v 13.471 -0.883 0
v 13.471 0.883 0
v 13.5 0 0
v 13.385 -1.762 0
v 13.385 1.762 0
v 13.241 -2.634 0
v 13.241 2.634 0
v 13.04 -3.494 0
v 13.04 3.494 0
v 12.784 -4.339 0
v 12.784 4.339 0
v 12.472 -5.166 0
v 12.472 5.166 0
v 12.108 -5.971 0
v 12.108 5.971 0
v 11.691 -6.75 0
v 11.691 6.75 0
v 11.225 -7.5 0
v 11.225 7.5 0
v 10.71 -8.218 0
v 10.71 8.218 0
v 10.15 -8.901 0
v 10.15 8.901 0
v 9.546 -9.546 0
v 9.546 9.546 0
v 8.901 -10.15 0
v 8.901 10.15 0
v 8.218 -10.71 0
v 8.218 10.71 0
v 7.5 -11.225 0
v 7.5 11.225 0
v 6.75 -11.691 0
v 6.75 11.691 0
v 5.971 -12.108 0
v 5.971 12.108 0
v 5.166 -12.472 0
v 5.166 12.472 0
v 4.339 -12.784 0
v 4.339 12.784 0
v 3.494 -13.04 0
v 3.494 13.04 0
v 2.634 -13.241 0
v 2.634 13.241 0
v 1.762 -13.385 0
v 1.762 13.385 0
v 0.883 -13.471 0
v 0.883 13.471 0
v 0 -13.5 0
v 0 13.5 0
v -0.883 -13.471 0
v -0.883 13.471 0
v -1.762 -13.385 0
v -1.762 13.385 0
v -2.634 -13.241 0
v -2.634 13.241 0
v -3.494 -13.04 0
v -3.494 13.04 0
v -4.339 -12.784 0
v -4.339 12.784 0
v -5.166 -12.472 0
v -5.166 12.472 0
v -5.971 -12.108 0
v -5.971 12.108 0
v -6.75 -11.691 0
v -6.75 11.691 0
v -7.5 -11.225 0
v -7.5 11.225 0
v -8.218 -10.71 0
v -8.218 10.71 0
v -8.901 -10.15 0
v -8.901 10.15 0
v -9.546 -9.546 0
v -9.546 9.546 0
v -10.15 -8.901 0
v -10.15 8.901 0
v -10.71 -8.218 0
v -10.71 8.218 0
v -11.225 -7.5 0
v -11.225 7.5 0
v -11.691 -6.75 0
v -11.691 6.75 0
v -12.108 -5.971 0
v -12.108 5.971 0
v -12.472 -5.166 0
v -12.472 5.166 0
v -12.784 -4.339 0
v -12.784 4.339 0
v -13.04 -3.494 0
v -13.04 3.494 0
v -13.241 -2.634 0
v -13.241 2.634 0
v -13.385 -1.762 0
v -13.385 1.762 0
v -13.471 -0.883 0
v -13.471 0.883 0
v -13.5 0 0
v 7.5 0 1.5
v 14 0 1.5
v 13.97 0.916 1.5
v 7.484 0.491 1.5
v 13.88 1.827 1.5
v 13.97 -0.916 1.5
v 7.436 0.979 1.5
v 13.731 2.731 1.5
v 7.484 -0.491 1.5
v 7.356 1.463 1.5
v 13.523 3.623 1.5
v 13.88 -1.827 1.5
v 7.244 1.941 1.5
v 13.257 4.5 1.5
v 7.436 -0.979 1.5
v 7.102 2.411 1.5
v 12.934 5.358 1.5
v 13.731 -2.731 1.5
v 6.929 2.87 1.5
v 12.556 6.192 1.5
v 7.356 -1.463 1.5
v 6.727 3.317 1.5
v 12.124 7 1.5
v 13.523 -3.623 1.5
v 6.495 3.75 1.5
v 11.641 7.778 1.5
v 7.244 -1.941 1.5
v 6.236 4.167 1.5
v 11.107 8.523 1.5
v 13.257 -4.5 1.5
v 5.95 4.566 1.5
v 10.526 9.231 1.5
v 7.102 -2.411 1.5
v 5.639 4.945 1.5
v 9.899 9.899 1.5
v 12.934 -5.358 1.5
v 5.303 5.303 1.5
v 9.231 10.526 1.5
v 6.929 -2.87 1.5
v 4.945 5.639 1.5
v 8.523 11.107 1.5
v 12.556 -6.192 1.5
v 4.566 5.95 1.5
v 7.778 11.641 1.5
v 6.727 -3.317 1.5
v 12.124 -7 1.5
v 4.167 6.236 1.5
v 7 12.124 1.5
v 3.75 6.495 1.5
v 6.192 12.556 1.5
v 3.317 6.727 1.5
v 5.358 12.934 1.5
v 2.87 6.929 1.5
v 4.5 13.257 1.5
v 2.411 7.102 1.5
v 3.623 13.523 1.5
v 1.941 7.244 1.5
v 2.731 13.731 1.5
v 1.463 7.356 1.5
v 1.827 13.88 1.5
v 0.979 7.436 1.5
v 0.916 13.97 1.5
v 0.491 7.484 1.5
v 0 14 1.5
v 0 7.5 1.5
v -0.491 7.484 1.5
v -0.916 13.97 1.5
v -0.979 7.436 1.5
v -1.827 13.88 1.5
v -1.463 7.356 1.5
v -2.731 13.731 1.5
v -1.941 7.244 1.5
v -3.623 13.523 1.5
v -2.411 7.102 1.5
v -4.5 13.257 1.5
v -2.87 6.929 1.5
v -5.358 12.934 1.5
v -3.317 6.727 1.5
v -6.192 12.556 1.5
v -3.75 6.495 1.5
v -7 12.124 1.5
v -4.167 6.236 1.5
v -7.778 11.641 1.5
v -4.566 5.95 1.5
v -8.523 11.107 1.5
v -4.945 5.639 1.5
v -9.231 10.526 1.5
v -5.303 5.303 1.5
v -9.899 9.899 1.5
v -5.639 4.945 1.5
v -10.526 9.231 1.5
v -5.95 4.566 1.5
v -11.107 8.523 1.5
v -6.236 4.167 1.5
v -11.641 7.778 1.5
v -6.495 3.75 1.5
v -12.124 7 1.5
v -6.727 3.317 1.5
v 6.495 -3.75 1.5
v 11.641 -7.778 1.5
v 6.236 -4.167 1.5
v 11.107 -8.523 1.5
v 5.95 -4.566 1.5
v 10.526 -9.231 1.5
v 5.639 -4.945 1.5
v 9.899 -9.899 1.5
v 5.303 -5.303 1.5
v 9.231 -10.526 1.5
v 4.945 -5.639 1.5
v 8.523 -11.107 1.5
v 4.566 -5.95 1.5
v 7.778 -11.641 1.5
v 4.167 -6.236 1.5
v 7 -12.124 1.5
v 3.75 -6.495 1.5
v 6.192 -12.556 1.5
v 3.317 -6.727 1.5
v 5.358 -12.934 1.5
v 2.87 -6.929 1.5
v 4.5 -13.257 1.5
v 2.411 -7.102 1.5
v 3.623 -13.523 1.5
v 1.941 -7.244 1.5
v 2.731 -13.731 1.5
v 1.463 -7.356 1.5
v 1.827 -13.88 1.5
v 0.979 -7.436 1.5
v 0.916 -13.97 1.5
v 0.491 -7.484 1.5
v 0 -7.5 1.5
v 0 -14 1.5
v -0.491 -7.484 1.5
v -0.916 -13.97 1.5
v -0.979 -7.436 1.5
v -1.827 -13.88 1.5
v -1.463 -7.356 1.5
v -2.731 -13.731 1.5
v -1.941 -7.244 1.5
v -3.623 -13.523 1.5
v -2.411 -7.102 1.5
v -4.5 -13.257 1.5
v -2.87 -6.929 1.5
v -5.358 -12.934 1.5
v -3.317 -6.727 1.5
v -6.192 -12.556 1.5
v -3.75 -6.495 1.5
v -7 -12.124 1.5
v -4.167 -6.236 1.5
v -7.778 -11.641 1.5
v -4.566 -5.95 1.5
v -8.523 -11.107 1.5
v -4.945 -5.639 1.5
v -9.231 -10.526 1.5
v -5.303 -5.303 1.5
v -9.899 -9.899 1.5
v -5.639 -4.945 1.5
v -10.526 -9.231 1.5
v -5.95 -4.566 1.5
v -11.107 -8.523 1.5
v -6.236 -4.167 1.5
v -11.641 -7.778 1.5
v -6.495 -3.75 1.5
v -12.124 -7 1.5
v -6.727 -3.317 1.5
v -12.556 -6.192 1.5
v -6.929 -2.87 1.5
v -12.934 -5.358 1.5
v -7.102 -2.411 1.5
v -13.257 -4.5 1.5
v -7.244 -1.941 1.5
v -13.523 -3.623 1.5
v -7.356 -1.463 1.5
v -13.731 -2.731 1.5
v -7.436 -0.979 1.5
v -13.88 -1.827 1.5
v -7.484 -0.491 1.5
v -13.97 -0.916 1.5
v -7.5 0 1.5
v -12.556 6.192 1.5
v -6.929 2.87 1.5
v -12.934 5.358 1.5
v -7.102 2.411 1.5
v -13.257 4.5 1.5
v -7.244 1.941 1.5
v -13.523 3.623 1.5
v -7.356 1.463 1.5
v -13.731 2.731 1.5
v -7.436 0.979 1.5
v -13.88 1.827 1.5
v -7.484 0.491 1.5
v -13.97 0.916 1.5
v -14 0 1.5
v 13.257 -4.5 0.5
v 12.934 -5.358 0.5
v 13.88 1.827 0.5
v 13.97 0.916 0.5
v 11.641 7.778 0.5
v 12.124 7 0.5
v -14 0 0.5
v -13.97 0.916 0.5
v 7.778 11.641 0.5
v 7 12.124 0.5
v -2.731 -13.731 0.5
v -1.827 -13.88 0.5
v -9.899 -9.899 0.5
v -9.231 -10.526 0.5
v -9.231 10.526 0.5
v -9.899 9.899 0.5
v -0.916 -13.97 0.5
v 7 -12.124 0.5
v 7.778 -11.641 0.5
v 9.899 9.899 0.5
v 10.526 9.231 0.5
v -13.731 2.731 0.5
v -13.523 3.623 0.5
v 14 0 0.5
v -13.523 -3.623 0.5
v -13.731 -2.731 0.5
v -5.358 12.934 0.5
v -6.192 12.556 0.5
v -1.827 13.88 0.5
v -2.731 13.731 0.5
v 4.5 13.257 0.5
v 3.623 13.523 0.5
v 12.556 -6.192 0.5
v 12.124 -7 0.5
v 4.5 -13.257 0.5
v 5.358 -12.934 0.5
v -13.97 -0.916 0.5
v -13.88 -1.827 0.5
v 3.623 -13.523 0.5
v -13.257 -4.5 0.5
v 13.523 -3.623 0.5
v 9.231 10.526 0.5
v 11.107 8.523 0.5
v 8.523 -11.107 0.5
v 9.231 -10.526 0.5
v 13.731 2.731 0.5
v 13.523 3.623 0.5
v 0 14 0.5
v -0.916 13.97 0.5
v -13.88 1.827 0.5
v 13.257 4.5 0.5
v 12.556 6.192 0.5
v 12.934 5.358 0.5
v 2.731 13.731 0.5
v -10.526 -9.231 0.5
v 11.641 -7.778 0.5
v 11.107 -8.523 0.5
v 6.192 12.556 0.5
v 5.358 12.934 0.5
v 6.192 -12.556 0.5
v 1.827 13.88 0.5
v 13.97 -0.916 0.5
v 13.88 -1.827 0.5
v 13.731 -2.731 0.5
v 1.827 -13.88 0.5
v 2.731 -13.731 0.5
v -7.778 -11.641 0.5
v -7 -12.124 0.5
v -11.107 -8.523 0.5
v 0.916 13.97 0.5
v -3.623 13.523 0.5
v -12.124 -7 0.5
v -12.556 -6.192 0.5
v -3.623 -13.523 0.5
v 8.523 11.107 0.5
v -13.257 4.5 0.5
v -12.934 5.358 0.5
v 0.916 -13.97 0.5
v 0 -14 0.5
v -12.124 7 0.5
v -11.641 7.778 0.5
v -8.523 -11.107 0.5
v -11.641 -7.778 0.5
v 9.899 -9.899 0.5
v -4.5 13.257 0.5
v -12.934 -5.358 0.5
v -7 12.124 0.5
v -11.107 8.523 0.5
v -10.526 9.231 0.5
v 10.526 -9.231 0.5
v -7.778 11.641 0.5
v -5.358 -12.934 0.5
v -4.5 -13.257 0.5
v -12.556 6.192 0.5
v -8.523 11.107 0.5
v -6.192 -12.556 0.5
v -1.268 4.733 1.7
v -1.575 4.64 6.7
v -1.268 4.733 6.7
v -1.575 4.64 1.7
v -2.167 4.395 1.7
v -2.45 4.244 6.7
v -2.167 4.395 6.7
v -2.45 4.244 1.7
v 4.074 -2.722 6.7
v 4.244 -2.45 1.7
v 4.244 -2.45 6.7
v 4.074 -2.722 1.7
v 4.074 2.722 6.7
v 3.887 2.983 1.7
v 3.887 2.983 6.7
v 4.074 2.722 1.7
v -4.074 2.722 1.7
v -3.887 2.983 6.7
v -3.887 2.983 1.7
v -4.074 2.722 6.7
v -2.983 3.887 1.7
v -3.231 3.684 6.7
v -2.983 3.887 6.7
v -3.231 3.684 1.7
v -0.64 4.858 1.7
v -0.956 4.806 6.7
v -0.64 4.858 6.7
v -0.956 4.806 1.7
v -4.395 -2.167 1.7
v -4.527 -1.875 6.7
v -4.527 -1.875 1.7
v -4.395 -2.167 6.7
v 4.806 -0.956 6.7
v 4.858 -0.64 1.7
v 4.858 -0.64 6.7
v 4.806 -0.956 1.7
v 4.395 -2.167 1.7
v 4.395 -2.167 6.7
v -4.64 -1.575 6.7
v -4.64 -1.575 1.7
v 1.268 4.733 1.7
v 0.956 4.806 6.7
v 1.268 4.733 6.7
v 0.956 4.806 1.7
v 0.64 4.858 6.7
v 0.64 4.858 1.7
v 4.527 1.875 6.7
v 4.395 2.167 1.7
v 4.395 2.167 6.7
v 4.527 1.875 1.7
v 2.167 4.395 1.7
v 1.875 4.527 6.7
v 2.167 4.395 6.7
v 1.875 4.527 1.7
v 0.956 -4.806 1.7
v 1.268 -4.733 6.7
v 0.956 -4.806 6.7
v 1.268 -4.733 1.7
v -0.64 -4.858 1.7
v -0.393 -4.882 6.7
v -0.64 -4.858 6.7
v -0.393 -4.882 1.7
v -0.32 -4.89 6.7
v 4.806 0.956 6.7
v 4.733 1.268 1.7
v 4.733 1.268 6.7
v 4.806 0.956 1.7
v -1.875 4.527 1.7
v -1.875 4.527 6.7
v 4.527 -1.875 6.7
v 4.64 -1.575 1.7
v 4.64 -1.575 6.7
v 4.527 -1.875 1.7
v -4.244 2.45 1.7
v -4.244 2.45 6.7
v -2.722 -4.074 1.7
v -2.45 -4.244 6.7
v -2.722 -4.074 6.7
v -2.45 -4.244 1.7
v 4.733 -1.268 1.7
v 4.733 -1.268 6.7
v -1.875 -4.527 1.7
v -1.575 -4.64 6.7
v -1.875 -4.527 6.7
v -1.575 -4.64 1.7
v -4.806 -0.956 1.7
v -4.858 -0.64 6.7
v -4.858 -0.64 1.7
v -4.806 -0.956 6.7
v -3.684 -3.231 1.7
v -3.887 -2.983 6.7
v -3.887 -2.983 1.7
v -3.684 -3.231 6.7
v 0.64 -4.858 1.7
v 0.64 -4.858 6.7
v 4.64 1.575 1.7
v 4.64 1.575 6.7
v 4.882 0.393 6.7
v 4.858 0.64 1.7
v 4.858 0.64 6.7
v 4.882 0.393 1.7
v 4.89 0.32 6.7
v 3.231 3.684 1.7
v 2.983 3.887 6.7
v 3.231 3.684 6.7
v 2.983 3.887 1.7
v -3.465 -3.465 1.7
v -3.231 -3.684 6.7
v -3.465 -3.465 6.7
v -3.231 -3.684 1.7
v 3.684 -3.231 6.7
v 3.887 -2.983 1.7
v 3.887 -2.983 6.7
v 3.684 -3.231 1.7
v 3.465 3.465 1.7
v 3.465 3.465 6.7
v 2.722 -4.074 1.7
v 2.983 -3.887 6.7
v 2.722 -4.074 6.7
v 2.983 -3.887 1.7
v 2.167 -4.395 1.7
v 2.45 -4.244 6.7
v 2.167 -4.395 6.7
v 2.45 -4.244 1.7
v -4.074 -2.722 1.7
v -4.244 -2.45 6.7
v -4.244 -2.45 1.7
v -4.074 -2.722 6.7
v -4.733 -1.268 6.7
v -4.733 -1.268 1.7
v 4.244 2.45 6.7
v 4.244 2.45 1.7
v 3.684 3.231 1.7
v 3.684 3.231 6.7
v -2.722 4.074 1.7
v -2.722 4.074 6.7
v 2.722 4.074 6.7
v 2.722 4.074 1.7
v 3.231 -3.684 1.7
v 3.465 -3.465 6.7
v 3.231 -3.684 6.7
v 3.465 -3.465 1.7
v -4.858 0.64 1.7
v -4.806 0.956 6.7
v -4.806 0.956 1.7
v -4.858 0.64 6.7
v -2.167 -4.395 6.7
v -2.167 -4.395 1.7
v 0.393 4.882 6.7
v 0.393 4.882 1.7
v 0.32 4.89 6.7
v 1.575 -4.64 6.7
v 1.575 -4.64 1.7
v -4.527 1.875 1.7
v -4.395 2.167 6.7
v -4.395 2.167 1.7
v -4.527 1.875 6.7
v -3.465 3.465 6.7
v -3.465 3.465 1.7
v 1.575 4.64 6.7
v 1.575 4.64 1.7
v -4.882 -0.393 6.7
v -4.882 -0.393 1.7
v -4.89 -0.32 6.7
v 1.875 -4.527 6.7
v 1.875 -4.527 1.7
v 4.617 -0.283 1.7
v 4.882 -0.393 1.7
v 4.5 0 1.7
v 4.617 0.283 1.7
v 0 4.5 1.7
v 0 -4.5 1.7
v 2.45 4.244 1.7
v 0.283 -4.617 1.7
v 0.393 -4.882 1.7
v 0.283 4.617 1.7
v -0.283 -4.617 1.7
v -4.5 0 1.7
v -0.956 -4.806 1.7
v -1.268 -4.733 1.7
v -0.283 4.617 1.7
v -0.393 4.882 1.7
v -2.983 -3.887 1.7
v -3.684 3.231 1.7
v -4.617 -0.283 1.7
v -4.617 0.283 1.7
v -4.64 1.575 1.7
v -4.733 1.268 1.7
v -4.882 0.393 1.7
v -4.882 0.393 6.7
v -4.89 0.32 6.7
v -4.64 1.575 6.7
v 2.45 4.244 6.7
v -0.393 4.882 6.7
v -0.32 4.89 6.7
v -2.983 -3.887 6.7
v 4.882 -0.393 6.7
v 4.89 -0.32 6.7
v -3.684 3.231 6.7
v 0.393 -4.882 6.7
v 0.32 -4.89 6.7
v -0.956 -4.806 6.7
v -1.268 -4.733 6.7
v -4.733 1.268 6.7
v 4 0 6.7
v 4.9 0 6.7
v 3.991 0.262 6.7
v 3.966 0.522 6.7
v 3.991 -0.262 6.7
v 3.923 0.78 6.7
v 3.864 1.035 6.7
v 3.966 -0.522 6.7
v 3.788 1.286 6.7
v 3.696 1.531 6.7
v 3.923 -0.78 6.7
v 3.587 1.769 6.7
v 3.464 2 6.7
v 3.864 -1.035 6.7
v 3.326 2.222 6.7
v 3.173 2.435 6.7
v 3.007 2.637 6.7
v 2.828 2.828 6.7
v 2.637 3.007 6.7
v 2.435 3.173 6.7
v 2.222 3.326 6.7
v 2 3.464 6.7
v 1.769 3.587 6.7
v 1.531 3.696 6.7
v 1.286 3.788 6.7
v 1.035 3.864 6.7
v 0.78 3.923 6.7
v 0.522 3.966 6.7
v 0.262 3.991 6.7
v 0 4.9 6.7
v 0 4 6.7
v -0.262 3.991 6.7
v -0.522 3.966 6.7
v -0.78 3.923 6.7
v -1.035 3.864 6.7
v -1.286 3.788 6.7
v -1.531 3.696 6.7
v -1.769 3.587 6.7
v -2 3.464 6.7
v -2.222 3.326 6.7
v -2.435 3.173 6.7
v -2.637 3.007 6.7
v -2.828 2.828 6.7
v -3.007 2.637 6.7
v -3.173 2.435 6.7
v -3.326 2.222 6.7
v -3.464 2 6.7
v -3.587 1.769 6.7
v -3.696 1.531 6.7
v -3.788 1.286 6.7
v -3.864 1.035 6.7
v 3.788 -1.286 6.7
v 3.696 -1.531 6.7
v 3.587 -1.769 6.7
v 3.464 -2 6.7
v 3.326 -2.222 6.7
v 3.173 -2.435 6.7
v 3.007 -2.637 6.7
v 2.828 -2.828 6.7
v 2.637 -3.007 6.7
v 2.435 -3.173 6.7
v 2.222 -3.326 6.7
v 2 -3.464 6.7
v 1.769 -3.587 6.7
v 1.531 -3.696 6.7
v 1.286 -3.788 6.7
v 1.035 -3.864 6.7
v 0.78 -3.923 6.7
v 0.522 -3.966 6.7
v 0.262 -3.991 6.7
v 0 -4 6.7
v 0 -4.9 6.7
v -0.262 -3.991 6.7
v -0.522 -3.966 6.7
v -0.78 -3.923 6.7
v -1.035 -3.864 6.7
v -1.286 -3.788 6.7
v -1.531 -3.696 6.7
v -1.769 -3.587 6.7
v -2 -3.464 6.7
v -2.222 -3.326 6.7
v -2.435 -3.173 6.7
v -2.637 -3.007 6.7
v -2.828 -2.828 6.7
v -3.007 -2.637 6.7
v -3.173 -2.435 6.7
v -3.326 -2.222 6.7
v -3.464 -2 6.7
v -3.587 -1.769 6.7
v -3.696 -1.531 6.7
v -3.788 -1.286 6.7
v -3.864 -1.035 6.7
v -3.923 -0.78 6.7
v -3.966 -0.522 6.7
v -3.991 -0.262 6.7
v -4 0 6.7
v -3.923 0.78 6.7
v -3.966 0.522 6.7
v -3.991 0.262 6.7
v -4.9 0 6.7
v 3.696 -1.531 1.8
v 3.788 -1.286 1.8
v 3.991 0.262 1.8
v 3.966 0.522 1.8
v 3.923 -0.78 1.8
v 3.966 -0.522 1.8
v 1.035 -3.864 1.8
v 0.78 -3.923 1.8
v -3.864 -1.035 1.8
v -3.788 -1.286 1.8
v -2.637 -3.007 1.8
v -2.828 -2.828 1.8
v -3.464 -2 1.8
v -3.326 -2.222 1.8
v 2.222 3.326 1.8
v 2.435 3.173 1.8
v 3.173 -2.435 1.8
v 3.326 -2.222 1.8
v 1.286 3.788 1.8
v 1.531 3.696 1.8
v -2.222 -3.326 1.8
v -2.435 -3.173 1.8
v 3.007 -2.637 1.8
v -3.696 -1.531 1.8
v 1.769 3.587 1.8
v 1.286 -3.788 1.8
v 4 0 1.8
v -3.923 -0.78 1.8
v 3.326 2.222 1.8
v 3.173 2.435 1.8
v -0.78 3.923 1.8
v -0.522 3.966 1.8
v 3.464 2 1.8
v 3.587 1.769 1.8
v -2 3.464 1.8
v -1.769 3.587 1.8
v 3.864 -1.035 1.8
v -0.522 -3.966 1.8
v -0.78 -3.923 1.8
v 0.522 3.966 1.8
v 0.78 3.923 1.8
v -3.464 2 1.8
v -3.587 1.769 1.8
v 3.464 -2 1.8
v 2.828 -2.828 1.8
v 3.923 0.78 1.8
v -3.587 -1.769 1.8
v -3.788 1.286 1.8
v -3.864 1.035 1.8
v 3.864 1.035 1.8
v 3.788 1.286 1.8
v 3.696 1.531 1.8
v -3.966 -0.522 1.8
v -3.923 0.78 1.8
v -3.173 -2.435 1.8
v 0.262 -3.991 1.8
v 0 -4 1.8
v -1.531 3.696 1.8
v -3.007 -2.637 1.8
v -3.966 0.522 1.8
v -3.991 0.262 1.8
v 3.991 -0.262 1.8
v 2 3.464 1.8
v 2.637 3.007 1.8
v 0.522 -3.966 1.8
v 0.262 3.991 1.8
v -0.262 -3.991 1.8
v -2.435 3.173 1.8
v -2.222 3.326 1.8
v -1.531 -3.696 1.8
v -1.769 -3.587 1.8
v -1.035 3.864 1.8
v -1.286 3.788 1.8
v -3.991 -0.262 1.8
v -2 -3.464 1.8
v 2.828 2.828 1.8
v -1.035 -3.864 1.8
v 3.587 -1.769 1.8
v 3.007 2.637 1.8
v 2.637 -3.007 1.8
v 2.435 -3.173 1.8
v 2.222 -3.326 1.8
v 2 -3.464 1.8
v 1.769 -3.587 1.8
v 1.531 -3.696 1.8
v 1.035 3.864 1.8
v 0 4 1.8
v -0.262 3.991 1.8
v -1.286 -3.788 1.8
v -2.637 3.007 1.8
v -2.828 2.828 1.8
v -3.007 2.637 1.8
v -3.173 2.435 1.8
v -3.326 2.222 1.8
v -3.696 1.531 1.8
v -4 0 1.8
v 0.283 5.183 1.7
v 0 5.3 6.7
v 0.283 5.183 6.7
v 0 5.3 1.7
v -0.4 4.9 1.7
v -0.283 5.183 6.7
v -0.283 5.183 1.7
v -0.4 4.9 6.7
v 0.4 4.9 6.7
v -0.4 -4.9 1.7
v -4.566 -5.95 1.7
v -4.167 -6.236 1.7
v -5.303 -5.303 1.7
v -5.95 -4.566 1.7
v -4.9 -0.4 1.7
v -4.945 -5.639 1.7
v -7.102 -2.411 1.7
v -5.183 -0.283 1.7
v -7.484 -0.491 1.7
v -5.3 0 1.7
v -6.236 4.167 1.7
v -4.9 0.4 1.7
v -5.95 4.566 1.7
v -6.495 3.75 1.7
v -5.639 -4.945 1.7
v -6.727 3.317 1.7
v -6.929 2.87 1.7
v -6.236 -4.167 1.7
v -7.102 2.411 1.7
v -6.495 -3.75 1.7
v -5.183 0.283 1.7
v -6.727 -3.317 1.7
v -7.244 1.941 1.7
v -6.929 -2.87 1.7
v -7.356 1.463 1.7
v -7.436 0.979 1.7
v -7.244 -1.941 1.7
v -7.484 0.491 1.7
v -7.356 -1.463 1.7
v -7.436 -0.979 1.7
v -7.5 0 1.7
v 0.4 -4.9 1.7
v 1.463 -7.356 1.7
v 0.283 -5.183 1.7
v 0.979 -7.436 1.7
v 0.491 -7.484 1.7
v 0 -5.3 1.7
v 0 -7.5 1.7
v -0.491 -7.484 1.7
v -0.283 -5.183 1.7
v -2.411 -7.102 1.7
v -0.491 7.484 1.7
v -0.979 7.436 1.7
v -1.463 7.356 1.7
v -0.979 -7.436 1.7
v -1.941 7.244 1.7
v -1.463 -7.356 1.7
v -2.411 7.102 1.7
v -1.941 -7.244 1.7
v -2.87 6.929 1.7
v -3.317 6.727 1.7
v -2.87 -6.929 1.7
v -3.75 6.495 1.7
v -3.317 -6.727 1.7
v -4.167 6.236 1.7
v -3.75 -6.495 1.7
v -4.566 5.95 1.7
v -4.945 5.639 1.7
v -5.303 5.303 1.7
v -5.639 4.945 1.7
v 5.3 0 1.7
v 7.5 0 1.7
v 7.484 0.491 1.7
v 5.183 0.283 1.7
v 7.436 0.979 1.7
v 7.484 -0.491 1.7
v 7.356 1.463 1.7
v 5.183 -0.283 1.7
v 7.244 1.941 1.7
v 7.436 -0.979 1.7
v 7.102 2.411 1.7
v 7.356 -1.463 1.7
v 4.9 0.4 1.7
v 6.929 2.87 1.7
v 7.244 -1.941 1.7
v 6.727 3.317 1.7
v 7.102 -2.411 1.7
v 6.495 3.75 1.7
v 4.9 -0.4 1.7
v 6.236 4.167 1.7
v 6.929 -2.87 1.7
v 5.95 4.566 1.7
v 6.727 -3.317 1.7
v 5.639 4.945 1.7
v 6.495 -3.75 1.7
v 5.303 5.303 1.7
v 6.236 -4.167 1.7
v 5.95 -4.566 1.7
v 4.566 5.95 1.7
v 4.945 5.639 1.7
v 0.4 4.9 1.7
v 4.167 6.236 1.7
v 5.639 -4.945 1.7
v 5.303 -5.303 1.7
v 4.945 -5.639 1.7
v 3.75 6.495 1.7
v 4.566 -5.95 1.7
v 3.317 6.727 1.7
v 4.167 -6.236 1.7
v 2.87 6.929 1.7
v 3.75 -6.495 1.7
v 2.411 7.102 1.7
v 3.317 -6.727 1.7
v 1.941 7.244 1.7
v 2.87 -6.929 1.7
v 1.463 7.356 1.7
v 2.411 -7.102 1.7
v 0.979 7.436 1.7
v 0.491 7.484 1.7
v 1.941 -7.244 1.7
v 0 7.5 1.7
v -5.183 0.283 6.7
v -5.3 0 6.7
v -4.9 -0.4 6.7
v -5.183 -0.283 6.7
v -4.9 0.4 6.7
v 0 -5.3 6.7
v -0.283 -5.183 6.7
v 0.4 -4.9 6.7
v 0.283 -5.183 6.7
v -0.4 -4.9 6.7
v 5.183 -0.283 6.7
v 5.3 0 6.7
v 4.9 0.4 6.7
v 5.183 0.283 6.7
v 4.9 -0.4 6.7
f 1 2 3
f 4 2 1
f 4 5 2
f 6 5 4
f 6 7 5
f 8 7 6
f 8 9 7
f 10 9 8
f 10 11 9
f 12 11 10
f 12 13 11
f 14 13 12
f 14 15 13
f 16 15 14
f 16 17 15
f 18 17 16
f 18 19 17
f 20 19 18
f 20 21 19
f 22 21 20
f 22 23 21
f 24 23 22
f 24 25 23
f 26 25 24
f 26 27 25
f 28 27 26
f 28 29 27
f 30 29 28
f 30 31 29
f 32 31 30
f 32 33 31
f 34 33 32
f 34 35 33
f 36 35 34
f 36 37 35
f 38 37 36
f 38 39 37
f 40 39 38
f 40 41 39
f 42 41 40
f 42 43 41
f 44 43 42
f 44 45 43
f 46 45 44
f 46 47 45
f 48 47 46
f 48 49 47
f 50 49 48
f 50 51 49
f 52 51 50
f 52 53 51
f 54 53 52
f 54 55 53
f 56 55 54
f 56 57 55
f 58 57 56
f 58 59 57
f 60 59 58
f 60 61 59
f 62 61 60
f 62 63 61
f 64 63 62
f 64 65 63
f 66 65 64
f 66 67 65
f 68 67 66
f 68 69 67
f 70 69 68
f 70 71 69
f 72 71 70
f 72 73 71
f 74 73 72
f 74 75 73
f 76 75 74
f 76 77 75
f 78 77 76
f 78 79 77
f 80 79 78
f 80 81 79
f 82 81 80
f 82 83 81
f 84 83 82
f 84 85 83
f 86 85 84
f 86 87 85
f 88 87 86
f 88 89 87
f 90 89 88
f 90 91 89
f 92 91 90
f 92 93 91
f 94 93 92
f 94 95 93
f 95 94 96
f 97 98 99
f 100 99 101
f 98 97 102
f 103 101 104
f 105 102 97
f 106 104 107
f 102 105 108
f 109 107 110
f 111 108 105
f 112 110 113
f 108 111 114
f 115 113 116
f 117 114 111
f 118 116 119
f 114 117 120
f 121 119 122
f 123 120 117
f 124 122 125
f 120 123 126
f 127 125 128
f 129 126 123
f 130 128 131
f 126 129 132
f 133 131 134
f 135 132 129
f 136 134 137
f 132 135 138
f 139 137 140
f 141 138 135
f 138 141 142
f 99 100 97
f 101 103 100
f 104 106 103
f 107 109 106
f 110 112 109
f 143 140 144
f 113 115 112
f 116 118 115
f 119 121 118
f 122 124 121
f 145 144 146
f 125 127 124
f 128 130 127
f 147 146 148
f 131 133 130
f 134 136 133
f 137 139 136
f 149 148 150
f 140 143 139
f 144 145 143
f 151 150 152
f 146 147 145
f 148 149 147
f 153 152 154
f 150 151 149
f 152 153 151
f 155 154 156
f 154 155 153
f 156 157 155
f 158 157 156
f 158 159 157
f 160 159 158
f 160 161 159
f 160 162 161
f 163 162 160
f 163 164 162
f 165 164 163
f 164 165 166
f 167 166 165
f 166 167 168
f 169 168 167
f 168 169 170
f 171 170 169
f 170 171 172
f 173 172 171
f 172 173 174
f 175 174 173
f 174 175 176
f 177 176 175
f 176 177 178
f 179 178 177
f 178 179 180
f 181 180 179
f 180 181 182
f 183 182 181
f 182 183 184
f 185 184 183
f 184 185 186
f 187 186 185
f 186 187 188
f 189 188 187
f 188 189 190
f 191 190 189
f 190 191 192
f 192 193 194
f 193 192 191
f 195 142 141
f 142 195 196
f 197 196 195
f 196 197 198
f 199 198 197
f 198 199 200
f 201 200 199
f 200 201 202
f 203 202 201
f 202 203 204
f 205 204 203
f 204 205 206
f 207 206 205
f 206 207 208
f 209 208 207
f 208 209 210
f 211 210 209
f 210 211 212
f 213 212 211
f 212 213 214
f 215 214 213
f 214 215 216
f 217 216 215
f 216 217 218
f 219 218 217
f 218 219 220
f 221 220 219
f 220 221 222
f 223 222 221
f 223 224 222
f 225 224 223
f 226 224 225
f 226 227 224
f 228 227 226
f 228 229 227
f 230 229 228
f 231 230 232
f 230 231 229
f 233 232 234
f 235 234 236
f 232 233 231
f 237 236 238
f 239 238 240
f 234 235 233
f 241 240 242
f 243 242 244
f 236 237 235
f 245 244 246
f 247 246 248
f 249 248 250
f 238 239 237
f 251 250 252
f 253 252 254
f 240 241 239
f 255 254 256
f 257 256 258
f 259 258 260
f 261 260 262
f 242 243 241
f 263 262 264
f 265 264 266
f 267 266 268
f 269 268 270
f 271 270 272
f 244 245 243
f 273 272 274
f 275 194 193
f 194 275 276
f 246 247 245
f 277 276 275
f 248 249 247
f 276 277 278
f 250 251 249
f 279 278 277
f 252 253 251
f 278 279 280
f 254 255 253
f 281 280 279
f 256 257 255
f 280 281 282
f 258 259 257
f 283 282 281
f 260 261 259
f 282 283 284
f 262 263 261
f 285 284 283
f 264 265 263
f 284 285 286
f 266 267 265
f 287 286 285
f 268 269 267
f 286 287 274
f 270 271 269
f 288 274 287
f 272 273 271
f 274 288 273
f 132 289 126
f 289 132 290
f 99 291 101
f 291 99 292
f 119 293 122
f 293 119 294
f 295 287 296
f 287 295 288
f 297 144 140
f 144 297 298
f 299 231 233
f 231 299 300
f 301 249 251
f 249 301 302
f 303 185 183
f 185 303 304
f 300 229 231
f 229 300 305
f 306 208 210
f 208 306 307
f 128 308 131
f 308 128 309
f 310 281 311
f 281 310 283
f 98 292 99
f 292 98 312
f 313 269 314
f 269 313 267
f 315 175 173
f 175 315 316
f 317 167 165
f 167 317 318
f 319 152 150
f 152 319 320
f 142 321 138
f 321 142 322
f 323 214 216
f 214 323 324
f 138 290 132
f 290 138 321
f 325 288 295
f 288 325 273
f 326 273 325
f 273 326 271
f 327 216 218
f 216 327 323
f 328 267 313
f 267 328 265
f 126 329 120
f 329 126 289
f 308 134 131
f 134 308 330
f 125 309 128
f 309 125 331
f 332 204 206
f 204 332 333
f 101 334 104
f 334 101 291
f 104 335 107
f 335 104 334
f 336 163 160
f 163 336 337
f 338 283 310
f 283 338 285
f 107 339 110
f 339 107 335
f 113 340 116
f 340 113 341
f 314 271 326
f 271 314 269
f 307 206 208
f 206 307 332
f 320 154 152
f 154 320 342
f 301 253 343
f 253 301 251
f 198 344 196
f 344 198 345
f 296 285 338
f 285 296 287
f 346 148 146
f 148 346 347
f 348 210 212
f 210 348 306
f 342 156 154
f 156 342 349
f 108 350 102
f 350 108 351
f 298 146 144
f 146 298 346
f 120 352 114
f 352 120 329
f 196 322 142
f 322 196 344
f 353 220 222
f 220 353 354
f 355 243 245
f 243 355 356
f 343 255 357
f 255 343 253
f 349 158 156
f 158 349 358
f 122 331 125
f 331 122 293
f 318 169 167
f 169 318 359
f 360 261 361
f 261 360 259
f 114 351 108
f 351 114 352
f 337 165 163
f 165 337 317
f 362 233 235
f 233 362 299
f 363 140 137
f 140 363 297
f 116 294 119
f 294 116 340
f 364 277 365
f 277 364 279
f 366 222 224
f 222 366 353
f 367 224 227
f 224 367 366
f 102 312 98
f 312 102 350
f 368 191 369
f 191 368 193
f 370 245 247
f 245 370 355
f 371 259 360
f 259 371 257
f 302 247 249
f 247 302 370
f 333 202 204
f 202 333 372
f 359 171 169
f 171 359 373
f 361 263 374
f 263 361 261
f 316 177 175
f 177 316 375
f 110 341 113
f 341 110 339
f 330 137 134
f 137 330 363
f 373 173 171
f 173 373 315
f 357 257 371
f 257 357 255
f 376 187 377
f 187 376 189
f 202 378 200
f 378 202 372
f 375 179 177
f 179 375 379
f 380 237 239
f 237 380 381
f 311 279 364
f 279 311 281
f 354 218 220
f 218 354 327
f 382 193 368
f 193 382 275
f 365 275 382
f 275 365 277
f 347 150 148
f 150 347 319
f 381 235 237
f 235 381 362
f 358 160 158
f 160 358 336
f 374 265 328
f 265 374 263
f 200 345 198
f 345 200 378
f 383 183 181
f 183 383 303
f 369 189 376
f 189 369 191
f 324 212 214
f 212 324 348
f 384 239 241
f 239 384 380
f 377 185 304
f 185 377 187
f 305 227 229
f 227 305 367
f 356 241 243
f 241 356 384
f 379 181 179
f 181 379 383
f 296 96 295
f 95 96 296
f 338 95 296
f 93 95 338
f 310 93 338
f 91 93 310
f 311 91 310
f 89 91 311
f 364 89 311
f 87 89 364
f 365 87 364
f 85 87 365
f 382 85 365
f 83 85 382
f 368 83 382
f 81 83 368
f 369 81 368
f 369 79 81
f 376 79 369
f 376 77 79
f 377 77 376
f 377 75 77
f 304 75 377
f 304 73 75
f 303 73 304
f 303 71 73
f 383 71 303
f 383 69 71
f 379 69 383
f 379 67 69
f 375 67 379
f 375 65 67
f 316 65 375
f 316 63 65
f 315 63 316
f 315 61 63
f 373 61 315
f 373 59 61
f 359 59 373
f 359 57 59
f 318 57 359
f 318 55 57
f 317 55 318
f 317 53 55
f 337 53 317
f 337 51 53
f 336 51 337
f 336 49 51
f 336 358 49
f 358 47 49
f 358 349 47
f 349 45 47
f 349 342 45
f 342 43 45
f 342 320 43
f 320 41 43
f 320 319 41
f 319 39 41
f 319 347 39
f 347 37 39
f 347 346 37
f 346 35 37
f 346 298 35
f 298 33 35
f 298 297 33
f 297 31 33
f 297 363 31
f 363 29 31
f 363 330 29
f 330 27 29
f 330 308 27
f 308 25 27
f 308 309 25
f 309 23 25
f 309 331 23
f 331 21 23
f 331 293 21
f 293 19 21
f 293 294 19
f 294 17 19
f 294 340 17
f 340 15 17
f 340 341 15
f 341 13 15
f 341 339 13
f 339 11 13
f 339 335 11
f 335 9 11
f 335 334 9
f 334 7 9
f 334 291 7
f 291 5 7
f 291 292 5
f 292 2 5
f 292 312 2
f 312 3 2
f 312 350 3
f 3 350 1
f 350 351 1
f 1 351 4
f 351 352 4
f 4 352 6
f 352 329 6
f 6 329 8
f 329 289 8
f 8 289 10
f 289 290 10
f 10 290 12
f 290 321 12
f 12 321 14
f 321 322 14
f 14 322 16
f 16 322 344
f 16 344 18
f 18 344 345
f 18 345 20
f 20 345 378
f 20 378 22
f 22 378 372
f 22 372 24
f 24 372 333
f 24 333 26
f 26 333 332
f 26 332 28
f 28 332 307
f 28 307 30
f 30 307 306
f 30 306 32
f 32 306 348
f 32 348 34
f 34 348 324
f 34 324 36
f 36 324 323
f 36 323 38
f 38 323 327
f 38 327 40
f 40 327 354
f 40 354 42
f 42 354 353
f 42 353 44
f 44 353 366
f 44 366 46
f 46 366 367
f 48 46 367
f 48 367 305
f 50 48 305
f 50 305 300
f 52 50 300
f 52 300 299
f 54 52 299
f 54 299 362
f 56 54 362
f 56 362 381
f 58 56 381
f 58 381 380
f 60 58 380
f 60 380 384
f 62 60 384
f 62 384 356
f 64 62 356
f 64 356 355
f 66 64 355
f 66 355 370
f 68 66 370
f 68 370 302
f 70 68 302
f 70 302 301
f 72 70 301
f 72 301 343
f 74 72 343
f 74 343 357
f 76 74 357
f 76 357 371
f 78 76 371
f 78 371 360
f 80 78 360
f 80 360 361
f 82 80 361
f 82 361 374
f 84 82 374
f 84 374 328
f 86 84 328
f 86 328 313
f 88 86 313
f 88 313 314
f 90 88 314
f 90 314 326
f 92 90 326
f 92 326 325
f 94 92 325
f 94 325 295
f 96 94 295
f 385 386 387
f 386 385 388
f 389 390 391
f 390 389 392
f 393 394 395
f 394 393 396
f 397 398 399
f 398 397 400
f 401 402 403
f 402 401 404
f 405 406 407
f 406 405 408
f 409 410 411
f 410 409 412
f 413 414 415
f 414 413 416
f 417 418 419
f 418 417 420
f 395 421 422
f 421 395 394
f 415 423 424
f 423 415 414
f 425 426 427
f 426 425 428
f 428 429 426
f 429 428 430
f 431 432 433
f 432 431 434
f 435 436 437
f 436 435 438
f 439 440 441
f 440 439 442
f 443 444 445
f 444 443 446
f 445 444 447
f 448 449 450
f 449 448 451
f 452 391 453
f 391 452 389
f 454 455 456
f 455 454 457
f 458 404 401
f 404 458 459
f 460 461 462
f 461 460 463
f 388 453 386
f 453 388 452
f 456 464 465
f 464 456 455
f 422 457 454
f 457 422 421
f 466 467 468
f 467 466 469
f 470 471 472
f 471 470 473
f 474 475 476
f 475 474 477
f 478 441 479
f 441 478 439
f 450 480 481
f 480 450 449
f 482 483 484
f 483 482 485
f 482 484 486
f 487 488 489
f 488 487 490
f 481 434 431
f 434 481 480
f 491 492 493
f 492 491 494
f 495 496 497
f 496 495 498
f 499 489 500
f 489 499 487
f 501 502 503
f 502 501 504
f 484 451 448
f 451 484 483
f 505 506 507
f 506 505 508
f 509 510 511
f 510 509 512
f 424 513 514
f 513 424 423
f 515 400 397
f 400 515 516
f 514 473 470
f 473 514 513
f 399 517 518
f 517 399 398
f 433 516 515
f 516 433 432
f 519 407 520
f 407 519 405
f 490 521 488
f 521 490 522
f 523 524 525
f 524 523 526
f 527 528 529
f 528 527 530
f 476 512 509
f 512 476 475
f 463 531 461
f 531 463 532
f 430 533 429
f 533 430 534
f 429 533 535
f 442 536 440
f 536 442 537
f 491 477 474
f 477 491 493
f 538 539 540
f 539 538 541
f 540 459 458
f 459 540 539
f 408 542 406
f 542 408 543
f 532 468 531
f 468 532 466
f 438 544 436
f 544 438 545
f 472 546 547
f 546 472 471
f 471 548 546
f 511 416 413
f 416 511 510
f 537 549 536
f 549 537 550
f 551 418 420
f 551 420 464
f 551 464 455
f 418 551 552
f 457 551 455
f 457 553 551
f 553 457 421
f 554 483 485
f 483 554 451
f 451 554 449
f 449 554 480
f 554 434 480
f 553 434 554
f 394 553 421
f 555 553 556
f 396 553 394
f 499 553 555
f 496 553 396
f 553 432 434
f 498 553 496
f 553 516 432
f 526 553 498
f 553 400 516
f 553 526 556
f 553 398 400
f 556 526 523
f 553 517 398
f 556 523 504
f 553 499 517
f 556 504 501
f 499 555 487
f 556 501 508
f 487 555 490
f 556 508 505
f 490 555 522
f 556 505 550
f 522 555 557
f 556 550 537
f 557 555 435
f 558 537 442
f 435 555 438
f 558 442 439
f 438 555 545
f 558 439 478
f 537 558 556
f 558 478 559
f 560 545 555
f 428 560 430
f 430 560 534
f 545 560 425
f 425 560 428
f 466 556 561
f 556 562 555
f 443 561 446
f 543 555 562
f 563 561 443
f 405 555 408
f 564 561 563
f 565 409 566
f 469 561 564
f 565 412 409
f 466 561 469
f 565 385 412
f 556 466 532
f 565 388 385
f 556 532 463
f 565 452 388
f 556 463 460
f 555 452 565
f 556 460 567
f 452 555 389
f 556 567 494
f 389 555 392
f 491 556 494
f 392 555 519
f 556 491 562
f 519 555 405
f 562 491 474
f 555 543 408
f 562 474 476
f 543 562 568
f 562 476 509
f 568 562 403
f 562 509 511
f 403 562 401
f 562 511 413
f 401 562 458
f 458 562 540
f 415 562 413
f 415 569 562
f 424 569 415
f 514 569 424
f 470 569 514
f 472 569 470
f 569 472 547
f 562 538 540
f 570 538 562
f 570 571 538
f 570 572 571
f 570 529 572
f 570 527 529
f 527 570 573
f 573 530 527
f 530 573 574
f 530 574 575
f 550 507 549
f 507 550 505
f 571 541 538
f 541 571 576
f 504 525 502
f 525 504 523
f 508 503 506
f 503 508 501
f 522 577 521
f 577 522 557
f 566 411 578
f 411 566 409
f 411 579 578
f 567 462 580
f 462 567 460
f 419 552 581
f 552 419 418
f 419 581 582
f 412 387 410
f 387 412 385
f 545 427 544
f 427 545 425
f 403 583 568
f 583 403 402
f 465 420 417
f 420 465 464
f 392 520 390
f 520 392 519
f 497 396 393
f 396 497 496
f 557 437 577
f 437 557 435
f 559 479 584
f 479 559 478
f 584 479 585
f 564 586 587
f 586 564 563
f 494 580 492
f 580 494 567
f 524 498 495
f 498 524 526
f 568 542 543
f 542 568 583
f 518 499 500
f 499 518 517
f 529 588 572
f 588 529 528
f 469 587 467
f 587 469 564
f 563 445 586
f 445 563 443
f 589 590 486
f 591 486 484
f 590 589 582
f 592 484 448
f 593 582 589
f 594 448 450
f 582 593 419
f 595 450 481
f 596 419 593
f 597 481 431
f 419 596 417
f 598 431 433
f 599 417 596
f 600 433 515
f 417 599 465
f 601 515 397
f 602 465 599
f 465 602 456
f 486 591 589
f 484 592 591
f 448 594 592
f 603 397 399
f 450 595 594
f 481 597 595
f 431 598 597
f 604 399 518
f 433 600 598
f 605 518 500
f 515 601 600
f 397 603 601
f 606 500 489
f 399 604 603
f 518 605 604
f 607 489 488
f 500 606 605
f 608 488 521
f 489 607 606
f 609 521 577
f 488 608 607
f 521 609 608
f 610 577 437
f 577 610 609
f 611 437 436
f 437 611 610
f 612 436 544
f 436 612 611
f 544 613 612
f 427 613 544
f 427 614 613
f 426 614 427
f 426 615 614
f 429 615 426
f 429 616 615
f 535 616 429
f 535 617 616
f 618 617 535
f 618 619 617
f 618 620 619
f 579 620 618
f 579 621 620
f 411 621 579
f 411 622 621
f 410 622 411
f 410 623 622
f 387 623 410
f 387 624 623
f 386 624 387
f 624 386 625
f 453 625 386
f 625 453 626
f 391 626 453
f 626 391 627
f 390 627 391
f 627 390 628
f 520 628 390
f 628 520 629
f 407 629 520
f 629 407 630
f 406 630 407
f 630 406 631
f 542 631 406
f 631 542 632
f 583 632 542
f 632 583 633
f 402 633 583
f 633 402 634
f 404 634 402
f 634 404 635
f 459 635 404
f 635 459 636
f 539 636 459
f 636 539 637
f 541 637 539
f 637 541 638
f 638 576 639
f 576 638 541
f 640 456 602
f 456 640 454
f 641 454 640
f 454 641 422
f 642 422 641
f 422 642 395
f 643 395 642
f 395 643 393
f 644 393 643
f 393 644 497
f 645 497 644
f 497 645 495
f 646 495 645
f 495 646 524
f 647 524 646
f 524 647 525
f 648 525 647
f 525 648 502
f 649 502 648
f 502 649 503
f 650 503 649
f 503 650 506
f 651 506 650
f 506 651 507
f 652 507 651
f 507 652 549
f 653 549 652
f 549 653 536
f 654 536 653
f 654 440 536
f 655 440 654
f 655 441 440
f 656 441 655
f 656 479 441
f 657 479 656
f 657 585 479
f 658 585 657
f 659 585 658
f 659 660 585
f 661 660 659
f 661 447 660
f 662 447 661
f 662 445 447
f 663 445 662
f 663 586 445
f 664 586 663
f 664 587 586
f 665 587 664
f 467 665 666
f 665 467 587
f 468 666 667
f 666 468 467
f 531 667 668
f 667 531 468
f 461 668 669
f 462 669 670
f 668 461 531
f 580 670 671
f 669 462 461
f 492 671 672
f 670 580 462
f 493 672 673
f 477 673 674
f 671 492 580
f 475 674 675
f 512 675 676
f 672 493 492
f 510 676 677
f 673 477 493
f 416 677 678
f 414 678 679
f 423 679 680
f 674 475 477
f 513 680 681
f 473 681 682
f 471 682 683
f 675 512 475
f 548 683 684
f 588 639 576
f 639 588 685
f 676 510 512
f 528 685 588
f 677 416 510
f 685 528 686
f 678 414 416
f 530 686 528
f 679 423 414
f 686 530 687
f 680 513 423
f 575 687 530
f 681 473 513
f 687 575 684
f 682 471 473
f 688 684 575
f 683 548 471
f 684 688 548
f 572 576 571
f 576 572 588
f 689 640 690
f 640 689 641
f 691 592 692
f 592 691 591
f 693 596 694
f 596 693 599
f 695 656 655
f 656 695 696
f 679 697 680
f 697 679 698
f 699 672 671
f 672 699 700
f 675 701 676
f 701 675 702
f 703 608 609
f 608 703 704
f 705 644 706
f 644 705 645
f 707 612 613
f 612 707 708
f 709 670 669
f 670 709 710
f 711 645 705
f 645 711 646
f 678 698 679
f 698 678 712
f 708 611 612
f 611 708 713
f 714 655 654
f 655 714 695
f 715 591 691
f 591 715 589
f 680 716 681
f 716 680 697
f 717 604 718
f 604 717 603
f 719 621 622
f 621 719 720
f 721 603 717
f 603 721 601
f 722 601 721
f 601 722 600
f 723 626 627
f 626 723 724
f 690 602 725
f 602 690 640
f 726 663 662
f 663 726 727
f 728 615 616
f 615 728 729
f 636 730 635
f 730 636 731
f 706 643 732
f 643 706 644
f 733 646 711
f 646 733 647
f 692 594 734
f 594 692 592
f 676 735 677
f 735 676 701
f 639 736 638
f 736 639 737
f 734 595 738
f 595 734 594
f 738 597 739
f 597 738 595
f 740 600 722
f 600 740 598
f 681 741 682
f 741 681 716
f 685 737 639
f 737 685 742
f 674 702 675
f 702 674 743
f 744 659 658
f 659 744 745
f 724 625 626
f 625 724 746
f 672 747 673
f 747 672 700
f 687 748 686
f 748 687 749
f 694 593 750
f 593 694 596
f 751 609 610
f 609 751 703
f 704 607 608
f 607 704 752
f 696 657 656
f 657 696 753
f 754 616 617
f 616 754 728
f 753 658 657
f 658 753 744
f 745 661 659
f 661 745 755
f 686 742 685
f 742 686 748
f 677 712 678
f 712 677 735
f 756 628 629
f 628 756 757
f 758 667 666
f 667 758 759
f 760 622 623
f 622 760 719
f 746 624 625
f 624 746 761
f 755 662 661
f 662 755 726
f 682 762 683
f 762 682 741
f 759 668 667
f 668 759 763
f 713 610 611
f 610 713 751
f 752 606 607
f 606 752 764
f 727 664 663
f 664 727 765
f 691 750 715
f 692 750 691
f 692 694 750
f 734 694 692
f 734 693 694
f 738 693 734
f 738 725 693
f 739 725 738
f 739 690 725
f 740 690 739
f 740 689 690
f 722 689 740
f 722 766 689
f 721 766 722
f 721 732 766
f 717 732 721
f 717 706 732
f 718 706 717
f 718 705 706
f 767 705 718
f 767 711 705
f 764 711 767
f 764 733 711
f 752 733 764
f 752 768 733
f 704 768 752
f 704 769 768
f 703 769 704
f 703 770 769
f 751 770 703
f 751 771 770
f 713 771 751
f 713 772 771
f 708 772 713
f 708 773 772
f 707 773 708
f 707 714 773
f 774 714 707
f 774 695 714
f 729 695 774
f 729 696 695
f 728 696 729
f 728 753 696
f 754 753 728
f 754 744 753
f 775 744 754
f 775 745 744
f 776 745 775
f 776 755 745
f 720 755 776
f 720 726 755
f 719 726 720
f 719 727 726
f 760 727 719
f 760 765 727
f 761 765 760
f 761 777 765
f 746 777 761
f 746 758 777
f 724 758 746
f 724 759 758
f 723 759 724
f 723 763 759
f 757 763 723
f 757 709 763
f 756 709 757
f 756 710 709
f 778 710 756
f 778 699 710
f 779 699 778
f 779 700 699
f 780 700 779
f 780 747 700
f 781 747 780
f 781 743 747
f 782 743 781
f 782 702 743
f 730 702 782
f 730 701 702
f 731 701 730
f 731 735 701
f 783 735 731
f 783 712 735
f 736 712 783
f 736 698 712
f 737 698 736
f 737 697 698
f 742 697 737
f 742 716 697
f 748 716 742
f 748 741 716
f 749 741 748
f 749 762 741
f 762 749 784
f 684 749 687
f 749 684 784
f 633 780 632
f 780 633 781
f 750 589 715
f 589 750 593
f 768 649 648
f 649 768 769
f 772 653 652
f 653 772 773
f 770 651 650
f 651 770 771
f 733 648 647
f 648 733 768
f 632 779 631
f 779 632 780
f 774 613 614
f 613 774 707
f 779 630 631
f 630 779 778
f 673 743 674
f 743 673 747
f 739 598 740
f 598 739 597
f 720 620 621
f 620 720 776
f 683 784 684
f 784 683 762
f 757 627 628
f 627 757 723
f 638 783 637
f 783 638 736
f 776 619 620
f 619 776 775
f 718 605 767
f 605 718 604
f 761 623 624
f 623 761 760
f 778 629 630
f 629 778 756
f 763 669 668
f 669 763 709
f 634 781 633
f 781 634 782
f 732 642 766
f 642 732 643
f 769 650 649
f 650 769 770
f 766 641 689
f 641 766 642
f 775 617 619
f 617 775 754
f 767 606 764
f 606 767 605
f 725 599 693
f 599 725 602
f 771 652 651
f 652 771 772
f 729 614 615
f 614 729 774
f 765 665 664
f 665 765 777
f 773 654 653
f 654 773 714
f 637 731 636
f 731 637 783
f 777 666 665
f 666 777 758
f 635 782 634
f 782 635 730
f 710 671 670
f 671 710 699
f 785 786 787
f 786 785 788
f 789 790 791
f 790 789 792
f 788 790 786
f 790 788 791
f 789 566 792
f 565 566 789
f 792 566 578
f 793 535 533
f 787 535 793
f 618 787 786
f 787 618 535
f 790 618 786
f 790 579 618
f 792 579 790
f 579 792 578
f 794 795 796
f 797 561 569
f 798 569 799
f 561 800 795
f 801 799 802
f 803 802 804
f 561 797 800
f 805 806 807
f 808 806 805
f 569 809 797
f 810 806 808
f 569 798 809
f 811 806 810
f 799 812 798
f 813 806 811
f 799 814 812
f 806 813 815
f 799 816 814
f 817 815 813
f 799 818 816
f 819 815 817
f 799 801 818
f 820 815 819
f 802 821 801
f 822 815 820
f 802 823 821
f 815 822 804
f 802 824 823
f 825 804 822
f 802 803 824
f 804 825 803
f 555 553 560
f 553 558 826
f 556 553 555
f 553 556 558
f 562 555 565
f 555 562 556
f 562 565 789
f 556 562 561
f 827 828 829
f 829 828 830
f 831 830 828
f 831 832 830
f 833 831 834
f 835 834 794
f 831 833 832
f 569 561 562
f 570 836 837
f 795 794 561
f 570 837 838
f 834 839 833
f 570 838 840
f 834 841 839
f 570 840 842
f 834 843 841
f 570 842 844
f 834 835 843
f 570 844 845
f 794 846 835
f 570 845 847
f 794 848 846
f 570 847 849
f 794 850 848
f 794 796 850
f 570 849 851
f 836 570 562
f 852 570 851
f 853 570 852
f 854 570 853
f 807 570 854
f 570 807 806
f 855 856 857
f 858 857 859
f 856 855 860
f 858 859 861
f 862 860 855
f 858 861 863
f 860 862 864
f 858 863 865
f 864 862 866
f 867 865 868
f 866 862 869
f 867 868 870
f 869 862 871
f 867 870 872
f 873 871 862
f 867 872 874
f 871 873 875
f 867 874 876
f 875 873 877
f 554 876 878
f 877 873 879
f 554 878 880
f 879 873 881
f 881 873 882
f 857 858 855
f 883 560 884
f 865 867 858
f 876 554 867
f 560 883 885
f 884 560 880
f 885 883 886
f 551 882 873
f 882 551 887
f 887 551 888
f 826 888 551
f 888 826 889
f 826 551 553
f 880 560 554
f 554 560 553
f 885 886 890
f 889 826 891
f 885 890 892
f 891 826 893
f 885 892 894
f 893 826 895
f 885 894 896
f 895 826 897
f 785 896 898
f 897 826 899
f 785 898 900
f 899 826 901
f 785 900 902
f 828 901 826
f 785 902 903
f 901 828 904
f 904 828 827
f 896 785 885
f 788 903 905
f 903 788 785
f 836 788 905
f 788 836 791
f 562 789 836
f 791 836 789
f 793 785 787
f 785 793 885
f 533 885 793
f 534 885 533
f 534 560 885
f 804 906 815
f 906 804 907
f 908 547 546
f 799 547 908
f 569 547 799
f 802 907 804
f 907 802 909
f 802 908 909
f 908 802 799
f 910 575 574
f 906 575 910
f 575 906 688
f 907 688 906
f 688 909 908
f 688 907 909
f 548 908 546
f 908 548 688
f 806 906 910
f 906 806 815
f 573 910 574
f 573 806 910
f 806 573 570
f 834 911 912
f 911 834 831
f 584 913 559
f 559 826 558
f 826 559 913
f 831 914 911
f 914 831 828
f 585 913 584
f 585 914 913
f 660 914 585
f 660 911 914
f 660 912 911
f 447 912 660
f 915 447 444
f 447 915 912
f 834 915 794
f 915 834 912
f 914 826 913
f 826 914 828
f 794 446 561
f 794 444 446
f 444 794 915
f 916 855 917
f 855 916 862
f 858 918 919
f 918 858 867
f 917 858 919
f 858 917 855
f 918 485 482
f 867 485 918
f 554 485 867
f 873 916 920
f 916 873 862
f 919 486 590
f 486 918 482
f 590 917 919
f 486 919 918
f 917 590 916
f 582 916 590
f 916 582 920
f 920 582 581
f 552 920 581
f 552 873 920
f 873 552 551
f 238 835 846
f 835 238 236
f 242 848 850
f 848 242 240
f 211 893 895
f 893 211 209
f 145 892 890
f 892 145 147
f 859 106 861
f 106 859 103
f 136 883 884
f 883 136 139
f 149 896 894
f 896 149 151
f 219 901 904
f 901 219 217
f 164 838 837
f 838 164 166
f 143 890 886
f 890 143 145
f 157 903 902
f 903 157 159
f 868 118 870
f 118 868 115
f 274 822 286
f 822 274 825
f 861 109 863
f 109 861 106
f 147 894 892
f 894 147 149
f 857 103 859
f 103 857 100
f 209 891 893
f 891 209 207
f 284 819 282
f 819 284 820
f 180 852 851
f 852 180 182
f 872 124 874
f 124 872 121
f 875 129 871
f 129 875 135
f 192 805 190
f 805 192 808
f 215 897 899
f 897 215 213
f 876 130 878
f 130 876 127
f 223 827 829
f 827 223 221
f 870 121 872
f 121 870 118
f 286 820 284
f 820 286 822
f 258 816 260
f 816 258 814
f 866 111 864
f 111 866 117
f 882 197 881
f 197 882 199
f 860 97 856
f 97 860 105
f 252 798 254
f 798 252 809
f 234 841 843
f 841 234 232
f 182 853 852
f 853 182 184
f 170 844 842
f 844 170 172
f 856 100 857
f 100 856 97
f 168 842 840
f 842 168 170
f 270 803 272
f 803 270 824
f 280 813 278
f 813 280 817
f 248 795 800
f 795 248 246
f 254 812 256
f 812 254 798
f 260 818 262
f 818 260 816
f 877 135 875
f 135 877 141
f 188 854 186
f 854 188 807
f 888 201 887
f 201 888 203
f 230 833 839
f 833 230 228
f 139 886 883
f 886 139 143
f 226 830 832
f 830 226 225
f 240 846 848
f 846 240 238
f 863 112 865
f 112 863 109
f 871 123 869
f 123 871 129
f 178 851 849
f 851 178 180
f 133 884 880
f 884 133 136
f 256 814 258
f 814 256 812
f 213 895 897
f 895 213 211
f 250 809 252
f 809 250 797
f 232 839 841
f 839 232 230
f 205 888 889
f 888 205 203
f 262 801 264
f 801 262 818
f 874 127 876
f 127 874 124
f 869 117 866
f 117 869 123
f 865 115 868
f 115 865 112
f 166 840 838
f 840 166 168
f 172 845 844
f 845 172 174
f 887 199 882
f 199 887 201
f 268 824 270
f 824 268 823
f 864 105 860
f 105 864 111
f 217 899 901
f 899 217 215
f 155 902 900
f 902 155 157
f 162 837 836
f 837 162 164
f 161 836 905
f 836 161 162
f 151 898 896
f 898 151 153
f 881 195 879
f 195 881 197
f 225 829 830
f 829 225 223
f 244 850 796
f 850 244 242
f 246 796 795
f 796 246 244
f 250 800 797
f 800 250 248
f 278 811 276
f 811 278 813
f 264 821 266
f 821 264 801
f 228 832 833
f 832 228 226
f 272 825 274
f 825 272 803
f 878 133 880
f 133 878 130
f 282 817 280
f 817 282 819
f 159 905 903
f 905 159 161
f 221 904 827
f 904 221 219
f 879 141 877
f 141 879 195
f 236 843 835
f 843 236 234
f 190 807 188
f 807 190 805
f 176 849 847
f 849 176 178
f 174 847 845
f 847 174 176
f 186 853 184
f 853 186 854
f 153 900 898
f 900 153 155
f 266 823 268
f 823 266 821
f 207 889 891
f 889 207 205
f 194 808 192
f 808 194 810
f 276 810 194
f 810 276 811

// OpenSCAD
// file: shapes/inverted_chamfer_cylinder.scad
use <torus.scad>;

inverted_chamfer_cylinder();

module inverted_chamfer_cylinder(
    h = 10, 
    r = 5, 
    chamfer_radius = 1,
    extra_margin_bottom = 1,
    extra_margin_top = 1)
{    
    chamfer_diameter = chamfer_radius * 2;
    
    union()
    {
        translate([0, 0, h-chamfer_radius])
        hull()
        {            
            inverted_chamfer_rim_top();    
            
            translate([0,0,chamfer_radius])
            cylinder(
                h = extra_margin_top,
                r = r + chamfer_radius);
        }
        
        cylinder(h=h, r=r);
        
        hull()
        {            
            inverted_chamfer_rim_bottom();
            translate([0,0,-extra_margin_bottom])
            cylinder(
                h = extra_margin_bottom,
                r = r + chamfer_radius);
        }
    }
    
    module inverted_chamfer_rim_top()
    {
        difference()
        {
            inverted_chamfer_torus();
            
            translate([0,0,chamfer_radius])
            cylinder(
                h = chamfer_radius,
                r = r + chamfer_radius);
        }
    }
    
    module inverted_chamfer_rim_bottom()
    {
        translate([0,0,-chamfer_radius])
        difference()
        {
            inverted_chamfer_torus();
            
            cylinder(
                h = chamfer_radius,
                r = r + chamfer_radius);
        }
    }
    
    module inverted_chamfer_torus()
    {
        torus(h = chamfer_diameter, r = r + chamfer_radius, sides = 4);
    }
}
// file: shapes/chamfer_cylinder.scad
use <torus.scad>;

chamfer_cylinder();

module chamfer_cylinder(
    h = 10, 
    r = 5, 
    chamfer_radius = 1)
{
    chamfer_diameter = chamfer_radius * 2;
    union()
    {
        translate([0, 0, h-chamfer_diameter])
        chamfer_torus();    
        
        cylinder(
            h = h, 
            r = r - chamfer_radius);
        
        translate([0, 0, chamfer_radius])
        cylinder(
            h = h - (chamfer_radius * 2), 
            r = r);
        
        chamfer_torus();
    }
    
    module chamfer_torus()
    {
        torus(h = chamfer_diameter, r = r, sides = 4);
    }
}
// file: shapes/torus.scad
torus();

module torus(
    h = 2,     
    r = 10,   
    sides = $fn)
{
    tube_radius = h / 2;
    inside_radius = r - tube_radius;
    //translate([r,r,thickness_radius])
    translate([0,0,tube_radius])
    rotate_extrude()
    translate([inside_radius, 0, 0])
    circle(r = tube_radius, $fn = sides);
}
// file: shapes/bearing_race.scad
use <bearing_race_hole.scad>;

bearing_race();

module bearing_race(
    h = 10, 
    id = 28,
    od = 30,
    spline_qty = 8,
    spline_depth = 1)
{
    difference()
    {
        cylinder(
            h = h, 
            r = od / 2);
        
        bearing_race_hole(
            h = h,
            r = id / 2,
            spline_qty = spline_qty,
            spline_depth = spline_depth
        );
    }    
}
// file: shapes/bearing_race_hole.scad
use <bearing_race_spline.scad>;

bearing_race_hole();

module bearing_race_hole(
    h = 10, 
    r = 22,
    spline_qty = 4,
    spline_depth = 1,
    extra_margin_bottom = 1,
    extra_margin_top = 1)
{
    difference()
    {
        translate([0, 0, -extra_margin_bottom])
        cylinder(
            h = h + extra_margin_bottom + extra_margin_top, 
            r = r);
        
        rotate([0, 0, 360 / spline_qty / 2])
        splines();
    }
    
    module splines()
    {        
        for (i = [1:spline_qty])
        {
            angle = i * (360 / spline_qty);
            rotate([0, 0, angle])
            translate([r, 0, 0])
            bearing_race_spline(
                h = h, 
                r = spline_depth, 
                taper = h / 4, 
                $fn = 8);
        }        
    }
}
// file: shapes/bearing_race_spline.scad
bearing_race_spline();

module bearing_race_spline(
    h = 10, 
    r = 1,
    taper = 2.5)
{
    cylinder_height = h - (taper * 2);
    
    translate([0,0,taper + cylinder_height])
    cylinder(h = taper, r1 = r, r2 = 0);
    
    translate([0,0,taper])
    cylinder(h = cylinder_height, r = r);
    
    cylinder(h = taper, r1 = 0, r2 = r);
}
// file: shapes/shapes.lib.scad
use <bearing_race_spline.scad>;
use <bearing_race_hole.scad>;
use <bearing_race.scad>;
use <torus.scad>;
use <chamfer_cylinder.scad>;
use <inverted_chamfer_cylinder.scad>;
// main file
include <shapes/shapes.lib.scad>;

$fn = 96;

knob();

module knob(
    knob_diameter = 28,
    knob_thickness = 1.5, 
    chamfer_radius = 0.5,
    bearing_diameter = 10,
    bearing_clearance = 0.2,
    stem_depth = 5,   
    stem_bore = 8, 
    shoulder_height = 0.2,
    shoulder_diameter = 15,
    spline_qty = 4,
    spline_depth = 0.4)
{
    bearing_radius = bearing_diameter / 2;
    knob_radius = knob_diameter / 2;

    shoulder_radius = shoulder_diameter / 2;
    shoulder_z = knob_thickness; 

    stem_z = knob_thickness + shoulder_height;
    stem_radius = (bearing_diameter - bearing_clearance) /2;

    // knob outside
    chamfer_cylinder(
        h = knob_thickness, 
        r = knob_radius , 
        chamfer_radius = chamfer_radius);

    // knob inside
    translate([0, 0, chamfer_radius])
    cylinder(
        r = knob_radius,
        h = knob_thickness - chamfer_radius);

    // stem
    translate([0, 0, stem_z])
    stem();

    // shoulder
    translate([0, 0, shoulder_z])
    cylinder(
        h = shoulder_height,
        r = shoulder_radius);

    // splines
    splines();

    module stem()
    {
        stem_bore_radius = stem_bore / 2;
        difference()
        {
            cylinder(
                h = stem_depth,
                r = stem_radius);

            translate([0,0,0.1])
            cylinder(
                h = stem_depth + 0.2,
                r = stem_bore_radius);
        }
    }

    module splines()
    {        
        spline_z = knob_thickness + shoulder_height;
        spline_h = stem_depth;
        spline_taper = 0;

        for (i = [1:spline_qty])
        {
            angle = i * (360 / spline_qty);
            rotate([0,0,angle])
            translate([stem_radius, 0, spline_z])
            bearing_race_spline(
                h = spline_h, 
                r = spline_depth, 
                taper = spline_taper, 
                $fn = 8);
        }
    }
}
